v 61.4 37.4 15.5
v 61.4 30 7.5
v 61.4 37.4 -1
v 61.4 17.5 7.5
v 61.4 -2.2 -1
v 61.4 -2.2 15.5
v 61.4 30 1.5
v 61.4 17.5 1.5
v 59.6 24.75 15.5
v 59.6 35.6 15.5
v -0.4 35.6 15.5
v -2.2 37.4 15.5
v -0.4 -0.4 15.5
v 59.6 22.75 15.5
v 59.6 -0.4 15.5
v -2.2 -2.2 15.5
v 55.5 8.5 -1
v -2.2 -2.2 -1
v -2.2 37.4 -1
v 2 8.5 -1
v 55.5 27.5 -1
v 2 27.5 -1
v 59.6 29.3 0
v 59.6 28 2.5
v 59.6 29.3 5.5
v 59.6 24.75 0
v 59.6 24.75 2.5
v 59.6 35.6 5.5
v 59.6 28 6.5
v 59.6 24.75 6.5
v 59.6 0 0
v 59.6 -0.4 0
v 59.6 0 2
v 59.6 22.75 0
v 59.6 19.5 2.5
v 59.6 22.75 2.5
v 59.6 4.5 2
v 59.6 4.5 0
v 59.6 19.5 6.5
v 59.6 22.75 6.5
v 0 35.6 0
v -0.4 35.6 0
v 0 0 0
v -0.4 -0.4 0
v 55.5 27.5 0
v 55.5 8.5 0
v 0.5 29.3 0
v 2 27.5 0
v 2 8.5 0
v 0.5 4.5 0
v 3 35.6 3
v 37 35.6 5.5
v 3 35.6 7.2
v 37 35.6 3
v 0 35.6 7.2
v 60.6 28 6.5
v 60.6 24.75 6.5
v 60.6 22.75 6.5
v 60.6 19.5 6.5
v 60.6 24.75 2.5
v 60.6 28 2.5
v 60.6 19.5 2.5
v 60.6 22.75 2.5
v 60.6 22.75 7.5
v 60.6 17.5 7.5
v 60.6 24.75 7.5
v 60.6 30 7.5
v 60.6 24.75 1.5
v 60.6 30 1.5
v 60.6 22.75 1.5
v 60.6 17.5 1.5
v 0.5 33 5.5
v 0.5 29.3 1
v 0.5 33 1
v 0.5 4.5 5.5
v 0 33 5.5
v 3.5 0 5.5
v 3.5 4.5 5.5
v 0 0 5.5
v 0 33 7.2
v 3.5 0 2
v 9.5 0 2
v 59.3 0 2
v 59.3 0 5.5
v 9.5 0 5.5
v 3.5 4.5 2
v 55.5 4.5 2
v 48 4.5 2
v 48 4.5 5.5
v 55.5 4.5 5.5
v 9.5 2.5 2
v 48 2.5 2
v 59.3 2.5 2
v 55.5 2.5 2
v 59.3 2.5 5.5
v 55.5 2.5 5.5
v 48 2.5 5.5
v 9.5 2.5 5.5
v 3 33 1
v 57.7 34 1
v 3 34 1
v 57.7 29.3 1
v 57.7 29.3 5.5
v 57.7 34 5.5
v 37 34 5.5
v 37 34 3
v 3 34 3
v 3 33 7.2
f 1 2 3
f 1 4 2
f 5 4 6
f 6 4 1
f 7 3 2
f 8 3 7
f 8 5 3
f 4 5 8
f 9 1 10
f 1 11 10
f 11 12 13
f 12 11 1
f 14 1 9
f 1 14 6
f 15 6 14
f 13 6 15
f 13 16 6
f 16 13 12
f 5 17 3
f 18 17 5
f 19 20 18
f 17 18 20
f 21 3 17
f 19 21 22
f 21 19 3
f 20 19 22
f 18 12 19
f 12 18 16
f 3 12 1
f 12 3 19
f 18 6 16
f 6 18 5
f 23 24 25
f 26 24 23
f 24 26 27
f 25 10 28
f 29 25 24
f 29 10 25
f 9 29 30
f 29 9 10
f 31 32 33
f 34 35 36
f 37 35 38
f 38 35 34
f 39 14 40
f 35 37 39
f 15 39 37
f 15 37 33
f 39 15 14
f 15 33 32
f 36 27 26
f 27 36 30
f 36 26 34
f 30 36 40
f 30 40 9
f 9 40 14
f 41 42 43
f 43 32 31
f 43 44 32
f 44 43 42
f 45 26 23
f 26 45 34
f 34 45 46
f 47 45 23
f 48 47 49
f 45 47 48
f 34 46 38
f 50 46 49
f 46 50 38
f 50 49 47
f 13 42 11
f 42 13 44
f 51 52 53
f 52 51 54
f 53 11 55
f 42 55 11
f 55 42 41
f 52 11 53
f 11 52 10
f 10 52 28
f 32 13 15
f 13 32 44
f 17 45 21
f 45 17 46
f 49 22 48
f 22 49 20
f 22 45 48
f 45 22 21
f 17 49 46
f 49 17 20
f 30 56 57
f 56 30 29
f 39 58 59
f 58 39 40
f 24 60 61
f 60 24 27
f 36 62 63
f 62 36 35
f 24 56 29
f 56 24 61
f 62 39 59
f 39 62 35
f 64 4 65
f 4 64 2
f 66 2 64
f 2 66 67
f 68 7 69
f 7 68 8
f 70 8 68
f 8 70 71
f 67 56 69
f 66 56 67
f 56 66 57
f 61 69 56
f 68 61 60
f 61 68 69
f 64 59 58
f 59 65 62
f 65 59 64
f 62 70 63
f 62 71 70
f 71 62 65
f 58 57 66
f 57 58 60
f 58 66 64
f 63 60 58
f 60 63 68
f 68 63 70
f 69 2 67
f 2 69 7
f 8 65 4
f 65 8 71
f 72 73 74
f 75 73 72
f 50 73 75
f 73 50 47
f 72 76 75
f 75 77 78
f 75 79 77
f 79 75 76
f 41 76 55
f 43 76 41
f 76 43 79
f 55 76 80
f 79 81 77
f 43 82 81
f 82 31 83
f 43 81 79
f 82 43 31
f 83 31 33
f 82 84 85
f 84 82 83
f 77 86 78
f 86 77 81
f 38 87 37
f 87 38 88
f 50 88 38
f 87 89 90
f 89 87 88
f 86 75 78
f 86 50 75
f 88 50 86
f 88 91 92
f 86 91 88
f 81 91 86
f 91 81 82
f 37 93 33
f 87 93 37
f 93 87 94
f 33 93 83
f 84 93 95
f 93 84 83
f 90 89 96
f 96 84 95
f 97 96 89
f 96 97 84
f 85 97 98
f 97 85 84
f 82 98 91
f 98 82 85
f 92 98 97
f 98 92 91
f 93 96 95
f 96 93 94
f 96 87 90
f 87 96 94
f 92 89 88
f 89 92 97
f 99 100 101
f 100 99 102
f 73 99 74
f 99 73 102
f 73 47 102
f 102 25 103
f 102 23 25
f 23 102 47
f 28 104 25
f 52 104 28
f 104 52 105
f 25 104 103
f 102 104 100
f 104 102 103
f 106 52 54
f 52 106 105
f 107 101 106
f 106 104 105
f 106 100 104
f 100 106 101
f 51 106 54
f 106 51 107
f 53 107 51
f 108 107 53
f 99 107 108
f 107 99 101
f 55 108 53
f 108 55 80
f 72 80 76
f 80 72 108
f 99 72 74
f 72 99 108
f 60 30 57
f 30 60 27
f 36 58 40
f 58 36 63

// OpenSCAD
fx=0.4;
x=59.2;
y=35.2;
z=15.5;
bh=2.2;
$fn=32;
reset=[bh+44,5.3,0];
dl=[52,3.5,0];
bhz=1;
module top() {
difference(){
translate([-bh,-bh,-bhz]) cube([x+bh+bh,y+bh+bh,z+bhz]);
translate([-fx,-fx,0]) cube([x+fx+fx,y+fx+fx,z]);
translate([2,8.5,-bhz]) cube([53.5,19,z]);
translate([x,19.5,2.5]) cube([10,8.5,4]); //usb孔
translate([x+1+fx,19.5-2,2.5-1]) cube([10,8.5+4,4+2]); //usb框
}
cube([0.5,bh+y,5.5]);//lcd边条
cube([3.5,4.5,5.5]);
cube([x+bh,4.5,2]);
translate([9.5,0,0]) cube([x-9.5+0.1,2.5,5.5]);
translate([48,0,0]) cube([7.5,4.5,5.5]);
//translate([37,29.3,0])
// cube([2.3,bh+y-29.3,5.5]);
translate([0,29.3,0])
 cube([x+bh,y-29.3,2-1]);

translate([x-1.5,29.3,0]) cube([1.5+bh-1,bh+y-29.3,5.5]);
translate([37,34,0]) cube([2.3+19+bh,bh+y-34,5.5]);
translate([0,34,0]) cube([x,bh+y-34,3]);
translate([0,33,0]) cube([3,bh+y-33,5.5+1.2+0.5]);
if(fx>0) {
translate([x+fx,19.5+8.5/2-1,0]) cube([1,2,z]); //usb支撑
}
}

module switch(){
fx1=0.8;
bh=2;
if(fx>0) {
fx1=1.6;
}
r1=4.8+fx1+fx1;
difference(){
union(){
cylinder(r=r1/2,h=bh);
translate([-15,-r1/2,0]) cube([15,r1,bh]);
}
cylinder(r=r1/2-fx1,h=bh);
translate([-15,-r1/2+fx1,0]) cube([15,r1-fx1-fx1,bh]);
}
}
module bottom(){
z1=5+1.5;
bh=2;
difference(){
cube([x,y,z1]);
translate([1,bh,1.5]) cube([x-1-1.6,y-bh-bh,z1]);
translate([2,30,0]) cube([18,3.1,z1]); //com1
translate([1,0,z1-3.7]) cube([23,bh,z1]);//电池
translate([1+18,y-bh,1.5+2]) cube([33,bh,z1]);//天线
translate(dl) {
cylinder(r=0.7,h=bh);
translate([-7/2,-4/2,z1-3]) cube([7,4,z1]); //3x6 开关
}
translate(reset) switch();
}
translate(reset) cylinder(r=3/2,h=z1-4.2);//按键中心柱
}
//bottom();
//translate([0,-45,0]) 
top();
